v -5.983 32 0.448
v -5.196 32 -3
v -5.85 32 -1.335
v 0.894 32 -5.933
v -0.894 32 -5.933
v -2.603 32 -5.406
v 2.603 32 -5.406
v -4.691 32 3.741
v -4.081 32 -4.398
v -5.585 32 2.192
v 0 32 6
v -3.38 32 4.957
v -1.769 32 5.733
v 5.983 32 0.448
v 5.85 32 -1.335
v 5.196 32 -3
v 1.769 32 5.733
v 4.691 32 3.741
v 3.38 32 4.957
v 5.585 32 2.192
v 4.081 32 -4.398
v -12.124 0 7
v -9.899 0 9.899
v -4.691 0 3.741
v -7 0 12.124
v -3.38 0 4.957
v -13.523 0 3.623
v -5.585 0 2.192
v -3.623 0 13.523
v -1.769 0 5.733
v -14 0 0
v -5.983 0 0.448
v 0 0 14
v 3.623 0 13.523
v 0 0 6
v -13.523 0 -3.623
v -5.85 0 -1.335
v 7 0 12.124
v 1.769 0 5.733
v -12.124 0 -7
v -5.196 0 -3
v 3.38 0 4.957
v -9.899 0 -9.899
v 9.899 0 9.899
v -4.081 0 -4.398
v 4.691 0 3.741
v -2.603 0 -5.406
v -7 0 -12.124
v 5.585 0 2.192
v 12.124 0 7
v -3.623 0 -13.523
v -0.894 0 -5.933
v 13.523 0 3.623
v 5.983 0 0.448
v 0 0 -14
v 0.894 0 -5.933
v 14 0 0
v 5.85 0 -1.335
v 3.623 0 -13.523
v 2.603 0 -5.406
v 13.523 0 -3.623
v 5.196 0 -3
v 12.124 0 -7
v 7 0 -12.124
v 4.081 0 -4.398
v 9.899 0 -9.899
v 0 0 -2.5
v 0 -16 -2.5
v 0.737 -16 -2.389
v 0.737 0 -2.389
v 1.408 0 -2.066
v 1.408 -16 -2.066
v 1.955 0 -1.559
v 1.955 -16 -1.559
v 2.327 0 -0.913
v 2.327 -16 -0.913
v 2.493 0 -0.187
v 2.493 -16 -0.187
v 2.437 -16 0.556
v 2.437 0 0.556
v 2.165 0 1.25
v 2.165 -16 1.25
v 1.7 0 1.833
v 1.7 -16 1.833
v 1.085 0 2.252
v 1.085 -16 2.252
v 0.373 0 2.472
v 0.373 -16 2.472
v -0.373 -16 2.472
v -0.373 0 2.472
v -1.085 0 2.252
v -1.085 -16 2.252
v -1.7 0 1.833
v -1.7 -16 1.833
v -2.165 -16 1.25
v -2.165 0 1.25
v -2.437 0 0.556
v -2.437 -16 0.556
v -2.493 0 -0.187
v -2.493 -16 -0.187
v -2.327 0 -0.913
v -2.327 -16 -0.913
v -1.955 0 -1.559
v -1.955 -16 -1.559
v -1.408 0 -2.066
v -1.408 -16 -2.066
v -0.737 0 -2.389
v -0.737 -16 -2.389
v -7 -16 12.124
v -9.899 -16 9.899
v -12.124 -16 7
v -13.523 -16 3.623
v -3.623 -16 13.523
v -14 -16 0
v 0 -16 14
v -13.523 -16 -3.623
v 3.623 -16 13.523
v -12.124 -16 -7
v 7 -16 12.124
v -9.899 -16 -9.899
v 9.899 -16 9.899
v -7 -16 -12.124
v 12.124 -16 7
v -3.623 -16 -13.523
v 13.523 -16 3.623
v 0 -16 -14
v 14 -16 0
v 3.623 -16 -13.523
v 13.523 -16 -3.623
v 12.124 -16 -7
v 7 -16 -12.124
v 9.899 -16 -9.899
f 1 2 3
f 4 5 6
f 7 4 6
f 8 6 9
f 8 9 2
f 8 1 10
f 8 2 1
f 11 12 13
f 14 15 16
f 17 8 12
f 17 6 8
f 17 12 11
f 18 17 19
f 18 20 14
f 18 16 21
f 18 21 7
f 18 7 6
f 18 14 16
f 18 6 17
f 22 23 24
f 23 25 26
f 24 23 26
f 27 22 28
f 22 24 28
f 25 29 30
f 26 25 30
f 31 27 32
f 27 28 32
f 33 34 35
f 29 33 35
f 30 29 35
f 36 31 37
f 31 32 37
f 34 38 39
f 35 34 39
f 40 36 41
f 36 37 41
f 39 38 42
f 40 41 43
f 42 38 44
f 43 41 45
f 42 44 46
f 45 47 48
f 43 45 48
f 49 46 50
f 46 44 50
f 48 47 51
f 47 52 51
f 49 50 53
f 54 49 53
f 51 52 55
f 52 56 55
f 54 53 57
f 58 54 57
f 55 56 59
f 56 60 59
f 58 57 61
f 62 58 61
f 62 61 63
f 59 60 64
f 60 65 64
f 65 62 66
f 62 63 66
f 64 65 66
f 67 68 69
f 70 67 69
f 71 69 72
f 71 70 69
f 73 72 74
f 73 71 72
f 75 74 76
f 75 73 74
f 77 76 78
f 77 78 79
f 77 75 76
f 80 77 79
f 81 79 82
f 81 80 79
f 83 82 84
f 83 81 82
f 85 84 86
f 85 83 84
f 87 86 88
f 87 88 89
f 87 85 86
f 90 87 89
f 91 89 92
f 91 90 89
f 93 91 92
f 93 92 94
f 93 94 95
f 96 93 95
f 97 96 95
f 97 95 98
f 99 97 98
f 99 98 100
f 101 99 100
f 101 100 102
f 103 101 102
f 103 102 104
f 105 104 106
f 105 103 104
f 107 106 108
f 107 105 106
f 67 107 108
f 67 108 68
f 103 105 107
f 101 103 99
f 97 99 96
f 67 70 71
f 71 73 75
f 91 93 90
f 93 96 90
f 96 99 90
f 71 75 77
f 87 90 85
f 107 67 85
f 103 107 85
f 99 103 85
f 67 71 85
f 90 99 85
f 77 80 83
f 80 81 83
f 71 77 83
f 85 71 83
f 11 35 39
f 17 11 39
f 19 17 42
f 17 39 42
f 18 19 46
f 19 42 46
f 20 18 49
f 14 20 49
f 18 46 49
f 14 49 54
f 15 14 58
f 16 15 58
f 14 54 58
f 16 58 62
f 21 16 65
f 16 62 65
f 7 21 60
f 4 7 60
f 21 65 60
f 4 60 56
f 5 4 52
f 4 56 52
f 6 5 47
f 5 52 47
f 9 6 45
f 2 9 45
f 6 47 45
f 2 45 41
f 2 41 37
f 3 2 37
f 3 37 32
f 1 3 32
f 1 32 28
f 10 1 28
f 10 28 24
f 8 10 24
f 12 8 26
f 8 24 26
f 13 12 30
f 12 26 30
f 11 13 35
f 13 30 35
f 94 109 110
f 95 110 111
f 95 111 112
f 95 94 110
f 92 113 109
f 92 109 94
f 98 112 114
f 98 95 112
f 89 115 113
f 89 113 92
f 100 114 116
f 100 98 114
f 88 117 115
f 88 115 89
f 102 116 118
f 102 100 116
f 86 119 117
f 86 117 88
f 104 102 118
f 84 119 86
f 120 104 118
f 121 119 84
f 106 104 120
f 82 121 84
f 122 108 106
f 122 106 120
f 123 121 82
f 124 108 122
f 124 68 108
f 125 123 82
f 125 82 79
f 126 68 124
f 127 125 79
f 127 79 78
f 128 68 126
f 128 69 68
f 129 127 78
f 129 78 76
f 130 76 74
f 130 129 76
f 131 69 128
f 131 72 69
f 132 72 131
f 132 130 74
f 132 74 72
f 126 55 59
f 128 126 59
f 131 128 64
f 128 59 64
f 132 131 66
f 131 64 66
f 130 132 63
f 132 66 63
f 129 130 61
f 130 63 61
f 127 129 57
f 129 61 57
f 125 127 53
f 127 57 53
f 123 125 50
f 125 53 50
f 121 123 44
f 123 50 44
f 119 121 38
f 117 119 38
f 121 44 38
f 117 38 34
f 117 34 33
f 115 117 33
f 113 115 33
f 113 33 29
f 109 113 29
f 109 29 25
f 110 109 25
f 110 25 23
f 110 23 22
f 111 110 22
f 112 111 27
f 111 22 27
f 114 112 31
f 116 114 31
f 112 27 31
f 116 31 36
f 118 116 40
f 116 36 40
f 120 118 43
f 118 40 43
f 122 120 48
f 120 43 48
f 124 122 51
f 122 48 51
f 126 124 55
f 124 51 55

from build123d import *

# Parameters (mm, degrees)
SKETCH_1_R      = 6
EXTRUDE_1_DEPTH = 32
SKETCH_3_R      = 14
SKETCH_3_R_2    = 2.5
EXTRUDE_2_DEPTH = 16


with BuildPart() as part:
    # 草图1 → 凸台-拉伸1 (new body)
    with BuildSketch(Plane(origin=(0, 0, 0), x_dir=(1, 0, 0), z_dir=(0, 1, 0))):
        with Locations(Location((0, 0, 0), (0, 0, 270))):
            Circle(SKETCH_1_R)
    extrude(amount=EXTRUDE_1_DEPTH)

    # 草图3 → 凸台-拉伸2 (add)
    with BuildSketch(Plane.XZ):
        with Locations(Location((0, 0, 0), (0, 0, 270))):
            Circle(SKETCH_3_R)
        with Locations(Location((0, 0, 0), (0, 0, 270))):
            Circle(SKETCH_3_R_2, mode=Mode.SUBTRACT)
    extrude(amount=EXTRUDE_2_DEPTH)


solid = part.part
